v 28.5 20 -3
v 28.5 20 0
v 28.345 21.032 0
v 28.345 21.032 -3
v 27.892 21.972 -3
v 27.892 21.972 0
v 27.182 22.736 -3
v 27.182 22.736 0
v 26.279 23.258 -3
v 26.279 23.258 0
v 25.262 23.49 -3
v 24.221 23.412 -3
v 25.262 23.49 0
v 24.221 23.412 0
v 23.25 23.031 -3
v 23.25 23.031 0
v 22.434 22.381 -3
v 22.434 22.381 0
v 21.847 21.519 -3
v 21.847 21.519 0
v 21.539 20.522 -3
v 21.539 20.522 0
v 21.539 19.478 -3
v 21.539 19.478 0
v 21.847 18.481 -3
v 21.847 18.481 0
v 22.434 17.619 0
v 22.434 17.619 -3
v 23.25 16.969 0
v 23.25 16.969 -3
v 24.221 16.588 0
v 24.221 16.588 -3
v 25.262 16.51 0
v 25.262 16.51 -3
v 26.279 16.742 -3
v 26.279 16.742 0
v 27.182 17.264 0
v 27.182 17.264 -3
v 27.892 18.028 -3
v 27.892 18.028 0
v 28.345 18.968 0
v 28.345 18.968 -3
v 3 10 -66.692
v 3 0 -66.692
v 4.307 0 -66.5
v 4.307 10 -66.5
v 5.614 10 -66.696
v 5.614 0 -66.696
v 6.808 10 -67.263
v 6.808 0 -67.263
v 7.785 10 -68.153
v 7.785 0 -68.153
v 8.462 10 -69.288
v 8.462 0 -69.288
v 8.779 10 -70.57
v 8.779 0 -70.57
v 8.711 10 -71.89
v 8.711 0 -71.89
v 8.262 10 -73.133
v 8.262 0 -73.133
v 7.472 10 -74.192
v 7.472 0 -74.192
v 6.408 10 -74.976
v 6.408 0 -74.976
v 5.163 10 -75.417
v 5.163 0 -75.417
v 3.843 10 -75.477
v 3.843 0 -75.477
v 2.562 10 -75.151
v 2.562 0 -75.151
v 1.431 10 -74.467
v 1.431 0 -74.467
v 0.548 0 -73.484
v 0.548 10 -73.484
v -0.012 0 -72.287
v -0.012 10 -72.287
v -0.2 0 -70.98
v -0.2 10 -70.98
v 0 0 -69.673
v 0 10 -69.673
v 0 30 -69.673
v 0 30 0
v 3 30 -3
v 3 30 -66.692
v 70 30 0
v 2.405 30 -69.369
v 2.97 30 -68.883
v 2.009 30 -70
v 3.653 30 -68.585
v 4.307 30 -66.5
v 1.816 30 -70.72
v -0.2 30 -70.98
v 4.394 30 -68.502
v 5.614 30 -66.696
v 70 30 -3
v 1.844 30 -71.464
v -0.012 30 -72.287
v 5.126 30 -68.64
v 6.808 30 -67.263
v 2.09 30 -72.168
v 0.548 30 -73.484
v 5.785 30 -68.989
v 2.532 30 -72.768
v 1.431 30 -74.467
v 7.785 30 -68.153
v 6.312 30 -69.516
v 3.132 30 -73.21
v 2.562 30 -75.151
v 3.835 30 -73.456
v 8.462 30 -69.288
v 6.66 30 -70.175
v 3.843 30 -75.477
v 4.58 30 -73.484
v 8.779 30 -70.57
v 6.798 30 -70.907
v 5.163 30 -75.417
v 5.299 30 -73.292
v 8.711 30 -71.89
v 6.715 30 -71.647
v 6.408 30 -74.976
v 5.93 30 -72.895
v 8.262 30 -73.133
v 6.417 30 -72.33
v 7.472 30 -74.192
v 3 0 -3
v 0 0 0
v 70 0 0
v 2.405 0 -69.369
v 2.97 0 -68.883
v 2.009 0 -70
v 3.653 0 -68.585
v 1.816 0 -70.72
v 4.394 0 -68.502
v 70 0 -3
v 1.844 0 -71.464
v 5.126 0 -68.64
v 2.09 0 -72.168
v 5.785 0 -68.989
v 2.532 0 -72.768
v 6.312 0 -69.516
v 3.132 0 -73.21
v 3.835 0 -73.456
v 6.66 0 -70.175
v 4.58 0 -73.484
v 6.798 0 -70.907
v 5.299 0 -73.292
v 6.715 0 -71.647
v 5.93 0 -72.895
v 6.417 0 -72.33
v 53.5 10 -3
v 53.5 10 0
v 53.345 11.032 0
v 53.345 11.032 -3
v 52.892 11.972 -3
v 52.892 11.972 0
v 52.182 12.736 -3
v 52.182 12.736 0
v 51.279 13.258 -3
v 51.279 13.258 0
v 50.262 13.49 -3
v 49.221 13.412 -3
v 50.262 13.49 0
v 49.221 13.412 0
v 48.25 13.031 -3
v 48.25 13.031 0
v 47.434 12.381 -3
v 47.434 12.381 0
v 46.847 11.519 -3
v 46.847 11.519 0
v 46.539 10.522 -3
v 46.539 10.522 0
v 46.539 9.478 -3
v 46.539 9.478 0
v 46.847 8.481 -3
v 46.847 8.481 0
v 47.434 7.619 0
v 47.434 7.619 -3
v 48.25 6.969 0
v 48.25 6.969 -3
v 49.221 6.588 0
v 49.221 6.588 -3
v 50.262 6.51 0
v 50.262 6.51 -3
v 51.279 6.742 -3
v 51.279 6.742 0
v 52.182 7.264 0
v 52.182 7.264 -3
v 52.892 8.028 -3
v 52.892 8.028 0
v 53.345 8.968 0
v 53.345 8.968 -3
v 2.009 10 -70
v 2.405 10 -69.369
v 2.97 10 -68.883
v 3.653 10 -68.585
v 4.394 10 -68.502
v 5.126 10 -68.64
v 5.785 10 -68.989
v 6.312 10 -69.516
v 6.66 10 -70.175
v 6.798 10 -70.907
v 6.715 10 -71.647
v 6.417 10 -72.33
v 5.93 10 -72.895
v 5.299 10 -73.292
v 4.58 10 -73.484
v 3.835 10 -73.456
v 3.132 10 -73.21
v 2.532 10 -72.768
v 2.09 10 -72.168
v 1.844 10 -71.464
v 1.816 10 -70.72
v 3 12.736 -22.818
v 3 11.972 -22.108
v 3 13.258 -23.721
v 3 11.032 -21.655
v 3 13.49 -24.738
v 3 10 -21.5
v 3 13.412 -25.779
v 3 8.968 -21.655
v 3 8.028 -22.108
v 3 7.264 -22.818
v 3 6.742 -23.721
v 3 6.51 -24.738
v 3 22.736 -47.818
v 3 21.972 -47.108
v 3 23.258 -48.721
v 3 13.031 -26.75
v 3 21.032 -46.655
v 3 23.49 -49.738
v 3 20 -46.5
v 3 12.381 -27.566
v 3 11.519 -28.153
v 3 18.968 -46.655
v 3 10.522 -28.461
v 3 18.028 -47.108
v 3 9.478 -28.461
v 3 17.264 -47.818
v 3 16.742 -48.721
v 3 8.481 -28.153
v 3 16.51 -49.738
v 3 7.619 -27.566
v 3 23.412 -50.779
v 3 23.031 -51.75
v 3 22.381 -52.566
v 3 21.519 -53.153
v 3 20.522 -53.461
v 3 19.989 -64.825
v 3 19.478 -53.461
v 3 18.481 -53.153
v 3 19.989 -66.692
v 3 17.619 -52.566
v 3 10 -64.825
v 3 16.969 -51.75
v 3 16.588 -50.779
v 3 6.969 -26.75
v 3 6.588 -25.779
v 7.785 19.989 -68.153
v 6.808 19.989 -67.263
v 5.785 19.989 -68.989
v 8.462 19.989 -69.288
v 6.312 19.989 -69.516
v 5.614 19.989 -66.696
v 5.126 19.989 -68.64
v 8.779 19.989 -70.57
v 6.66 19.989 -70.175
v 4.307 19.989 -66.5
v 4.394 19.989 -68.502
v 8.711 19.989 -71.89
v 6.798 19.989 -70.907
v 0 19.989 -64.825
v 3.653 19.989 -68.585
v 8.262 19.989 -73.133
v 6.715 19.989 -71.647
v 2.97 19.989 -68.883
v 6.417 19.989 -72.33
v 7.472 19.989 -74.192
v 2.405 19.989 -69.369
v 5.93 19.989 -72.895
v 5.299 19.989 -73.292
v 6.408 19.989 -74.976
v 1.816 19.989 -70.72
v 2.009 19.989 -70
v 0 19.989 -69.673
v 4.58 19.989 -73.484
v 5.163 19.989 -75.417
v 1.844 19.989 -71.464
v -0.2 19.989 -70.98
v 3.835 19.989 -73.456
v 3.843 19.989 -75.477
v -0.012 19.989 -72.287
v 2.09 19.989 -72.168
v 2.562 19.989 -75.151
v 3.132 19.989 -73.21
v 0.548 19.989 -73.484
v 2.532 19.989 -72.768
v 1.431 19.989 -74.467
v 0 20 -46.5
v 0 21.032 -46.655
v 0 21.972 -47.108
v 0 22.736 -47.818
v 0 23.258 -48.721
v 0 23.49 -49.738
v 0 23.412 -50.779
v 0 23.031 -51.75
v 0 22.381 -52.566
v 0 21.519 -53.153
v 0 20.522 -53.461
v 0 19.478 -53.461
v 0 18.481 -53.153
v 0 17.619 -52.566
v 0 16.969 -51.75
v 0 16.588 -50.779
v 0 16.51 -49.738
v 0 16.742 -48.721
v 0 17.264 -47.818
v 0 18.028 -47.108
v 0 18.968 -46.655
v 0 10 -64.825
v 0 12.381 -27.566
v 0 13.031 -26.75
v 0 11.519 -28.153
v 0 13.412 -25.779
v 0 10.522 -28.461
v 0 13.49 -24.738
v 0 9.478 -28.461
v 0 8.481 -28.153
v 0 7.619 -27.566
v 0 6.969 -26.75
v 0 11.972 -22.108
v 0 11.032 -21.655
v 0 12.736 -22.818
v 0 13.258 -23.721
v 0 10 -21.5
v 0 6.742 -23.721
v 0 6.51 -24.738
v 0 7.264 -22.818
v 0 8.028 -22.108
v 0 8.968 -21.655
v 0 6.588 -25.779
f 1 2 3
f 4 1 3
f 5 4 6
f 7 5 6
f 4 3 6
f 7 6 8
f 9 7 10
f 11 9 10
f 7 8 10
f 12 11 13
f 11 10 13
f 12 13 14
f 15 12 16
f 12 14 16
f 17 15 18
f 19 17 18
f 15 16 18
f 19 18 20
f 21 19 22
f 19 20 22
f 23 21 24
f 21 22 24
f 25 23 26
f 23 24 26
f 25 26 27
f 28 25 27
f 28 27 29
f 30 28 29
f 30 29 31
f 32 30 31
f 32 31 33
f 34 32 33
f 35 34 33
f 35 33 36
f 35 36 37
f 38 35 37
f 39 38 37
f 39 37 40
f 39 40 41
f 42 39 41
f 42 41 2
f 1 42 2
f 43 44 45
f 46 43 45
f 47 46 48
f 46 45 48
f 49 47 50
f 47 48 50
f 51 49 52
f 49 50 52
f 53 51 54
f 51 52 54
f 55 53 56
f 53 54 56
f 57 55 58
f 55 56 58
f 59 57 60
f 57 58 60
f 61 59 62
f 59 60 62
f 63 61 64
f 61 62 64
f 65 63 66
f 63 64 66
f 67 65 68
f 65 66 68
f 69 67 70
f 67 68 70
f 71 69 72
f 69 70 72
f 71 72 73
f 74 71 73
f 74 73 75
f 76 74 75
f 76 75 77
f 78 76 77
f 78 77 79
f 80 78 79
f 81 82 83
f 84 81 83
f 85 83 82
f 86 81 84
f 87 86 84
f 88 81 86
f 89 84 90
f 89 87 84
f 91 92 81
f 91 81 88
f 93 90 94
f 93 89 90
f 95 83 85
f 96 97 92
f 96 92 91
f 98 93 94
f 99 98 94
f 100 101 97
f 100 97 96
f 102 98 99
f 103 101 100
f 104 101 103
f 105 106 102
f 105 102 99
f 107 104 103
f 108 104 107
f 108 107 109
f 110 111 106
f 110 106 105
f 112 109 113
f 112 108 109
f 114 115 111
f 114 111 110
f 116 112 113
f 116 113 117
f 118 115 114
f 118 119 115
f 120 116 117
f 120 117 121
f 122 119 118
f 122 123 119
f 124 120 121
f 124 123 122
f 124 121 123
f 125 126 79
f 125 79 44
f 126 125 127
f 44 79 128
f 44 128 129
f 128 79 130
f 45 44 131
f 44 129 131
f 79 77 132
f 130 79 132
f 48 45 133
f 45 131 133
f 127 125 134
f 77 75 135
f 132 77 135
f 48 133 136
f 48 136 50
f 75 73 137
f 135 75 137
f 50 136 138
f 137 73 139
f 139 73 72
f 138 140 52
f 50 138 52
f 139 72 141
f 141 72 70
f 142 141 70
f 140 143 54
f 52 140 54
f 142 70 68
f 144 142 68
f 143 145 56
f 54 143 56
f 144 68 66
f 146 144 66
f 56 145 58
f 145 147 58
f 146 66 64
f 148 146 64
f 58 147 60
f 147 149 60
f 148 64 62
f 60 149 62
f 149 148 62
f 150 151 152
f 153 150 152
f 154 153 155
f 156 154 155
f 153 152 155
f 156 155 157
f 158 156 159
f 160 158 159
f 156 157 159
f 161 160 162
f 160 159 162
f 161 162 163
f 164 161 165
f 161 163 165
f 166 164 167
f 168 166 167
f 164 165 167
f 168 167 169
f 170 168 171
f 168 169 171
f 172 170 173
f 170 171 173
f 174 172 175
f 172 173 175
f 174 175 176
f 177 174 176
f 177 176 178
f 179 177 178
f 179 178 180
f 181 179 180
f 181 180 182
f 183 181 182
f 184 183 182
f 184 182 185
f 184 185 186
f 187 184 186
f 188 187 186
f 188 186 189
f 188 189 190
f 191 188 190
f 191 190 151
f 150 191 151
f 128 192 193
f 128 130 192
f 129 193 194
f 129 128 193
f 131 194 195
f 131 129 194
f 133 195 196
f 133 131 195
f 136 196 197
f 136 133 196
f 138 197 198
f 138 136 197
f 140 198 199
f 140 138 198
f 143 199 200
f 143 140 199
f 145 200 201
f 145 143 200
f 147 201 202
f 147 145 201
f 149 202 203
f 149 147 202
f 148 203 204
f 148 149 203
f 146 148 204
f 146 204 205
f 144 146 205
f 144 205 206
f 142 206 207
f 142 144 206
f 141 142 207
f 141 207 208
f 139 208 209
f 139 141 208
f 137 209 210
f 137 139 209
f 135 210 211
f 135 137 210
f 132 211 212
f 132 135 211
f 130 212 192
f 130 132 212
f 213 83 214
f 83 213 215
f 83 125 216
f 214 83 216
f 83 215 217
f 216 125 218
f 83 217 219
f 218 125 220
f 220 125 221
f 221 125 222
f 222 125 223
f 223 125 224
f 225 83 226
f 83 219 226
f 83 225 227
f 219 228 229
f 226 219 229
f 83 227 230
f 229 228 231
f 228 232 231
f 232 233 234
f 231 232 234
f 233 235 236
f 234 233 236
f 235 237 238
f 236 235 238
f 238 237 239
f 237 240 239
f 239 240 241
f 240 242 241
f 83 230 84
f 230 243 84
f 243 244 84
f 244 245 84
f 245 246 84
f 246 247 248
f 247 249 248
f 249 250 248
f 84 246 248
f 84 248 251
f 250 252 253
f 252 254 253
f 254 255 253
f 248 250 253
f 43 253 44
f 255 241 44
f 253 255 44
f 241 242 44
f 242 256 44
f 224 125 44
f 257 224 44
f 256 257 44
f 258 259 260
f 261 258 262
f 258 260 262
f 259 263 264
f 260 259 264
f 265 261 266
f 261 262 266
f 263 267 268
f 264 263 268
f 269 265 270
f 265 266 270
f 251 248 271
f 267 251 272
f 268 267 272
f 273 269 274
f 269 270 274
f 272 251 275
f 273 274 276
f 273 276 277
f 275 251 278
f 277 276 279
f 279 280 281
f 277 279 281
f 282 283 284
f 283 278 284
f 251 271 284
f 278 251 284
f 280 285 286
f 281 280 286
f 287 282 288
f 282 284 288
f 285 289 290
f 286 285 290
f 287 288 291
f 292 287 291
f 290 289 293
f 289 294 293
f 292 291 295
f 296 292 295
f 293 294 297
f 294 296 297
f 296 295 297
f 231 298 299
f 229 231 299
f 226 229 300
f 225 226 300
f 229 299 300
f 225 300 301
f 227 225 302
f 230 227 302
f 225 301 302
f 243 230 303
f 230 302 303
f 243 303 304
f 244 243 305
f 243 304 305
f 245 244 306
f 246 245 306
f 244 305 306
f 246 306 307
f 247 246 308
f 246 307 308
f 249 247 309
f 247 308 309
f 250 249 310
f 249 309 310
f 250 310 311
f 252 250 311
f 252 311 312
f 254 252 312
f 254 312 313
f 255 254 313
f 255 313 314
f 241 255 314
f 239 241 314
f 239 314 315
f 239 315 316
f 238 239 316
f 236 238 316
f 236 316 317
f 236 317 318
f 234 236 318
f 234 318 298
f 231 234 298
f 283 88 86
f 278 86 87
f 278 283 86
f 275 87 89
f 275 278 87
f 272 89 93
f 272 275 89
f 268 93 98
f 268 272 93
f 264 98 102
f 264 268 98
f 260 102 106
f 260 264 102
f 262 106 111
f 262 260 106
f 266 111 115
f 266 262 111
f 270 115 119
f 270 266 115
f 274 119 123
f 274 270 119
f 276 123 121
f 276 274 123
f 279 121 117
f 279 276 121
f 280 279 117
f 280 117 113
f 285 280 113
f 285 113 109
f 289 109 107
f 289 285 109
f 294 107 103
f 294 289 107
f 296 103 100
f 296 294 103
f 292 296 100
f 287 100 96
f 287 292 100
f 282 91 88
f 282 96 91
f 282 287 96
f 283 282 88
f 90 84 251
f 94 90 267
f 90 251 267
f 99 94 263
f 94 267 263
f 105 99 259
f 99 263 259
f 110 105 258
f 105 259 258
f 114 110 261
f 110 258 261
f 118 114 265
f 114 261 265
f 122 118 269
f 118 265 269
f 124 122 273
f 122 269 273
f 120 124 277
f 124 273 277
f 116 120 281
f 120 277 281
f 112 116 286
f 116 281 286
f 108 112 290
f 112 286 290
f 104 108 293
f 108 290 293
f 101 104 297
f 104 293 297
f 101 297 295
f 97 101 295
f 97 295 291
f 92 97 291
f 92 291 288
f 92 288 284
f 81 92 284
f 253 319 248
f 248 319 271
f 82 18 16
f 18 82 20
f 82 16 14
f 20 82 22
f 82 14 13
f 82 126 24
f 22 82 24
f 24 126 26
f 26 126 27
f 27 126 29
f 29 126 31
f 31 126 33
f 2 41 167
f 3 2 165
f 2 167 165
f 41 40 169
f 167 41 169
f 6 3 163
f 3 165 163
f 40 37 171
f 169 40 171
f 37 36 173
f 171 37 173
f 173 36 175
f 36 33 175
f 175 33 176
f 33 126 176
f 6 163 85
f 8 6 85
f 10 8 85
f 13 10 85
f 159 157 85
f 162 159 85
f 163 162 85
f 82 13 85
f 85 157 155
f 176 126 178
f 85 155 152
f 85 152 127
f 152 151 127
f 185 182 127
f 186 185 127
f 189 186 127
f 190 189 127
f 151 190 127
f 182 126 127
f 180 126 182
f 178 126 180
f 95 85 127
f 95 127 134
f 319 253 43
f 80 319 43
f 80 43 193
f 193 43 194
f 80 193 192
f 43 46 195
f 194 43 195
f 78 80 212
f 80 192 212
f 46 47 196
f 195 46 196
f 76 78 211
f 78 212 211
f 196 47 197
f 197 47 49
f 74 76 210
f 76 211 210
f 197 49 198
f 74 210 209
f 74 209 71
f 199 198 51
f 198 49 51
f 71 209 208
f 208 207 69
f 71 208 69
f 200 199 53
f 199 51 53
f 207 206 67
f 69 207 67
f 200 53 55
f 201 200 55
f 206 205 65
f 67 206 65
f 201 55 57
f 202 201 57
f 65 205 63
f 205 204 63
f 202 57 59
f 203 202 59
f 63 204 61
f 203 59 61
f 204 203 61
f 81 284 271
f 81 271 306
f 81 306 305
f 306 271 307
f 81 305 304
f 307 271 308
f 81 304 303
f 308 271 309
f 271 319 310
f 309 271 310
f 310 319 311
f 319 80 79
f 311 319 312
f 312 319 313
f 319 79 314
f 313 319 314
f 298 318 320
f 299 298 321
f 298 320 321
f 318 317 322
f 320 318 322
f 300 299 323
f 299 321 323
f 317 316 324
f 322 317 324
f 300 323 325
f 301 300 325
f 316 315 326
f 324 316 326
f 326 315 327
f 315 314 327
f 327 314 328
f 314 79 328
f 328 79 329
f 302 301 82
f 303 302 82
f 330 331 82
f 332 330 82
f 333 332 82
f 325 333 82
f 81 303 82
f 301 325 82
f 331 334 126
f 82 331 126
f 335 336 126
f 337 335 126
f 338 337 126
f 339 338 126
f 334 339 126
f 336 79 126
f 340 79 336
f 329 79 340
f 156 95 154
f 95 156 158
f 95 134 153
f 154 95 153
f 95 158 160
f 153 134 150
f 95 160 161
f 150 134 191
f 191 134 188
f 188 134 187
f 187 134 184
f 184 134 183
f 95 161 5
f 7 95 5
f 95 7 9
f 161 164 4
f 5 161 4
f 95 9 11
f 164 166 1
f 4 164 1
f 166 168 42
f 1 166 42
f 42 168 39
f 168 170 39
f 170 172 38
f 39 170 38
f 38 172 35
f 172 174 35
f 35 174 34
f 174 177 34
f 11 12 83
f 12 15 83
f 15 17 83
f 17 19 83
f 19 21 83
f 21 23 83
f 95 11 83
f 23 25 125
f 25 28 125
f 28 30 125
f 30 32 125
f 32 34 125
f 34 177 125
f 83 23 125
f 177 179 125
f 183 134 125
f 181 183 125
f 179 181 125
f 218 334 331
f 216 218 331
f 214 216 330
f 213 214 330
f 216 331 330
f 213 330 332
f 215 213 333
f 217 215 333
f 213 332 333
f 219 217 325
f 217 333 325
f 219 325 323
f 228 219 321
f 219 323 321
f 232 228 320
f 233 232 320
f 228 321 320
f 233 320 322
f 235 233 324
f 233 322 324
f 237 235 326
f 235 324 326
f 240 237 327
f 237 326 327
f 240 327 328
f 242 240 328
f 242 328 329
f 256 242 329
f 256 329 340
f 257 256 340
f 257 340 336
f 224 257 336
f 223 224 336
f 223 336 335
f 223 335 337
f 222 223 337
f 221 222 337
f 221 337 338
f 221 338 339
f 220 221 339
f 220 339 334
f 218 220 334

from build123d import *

# Parameters (mm, degrees)
EXTRUDE_1_DEPTH          = 30
SKETCH_2_R               = 3.5
CUT_EXTRUDE_1_DEPTH      = 71
SKETCH_3_R               = 3.5
CUT_EXTRUDE_2_DEPTH      = 71
SKETCH_4_R               = 4.5
SKETCH_4_R_2             = 2.5
EXTRUDE_2_DEPTH          = 30
SKETCH_5_R               = 2.5
CUT_EXTRUDE_6_DEPTH      = 31
SKETCH_6_W               = 11.97763243
SKETCH_6_H               = 9.98933257
CUT_EXTRUDE_8_DEPTH      = 71
CUT_EXTRUDE_8_DEPTH_BACK = 1.2


with BuildPart() as part:
    # Эскиз1 → Вытянуть-Тонкостенный1 (new body)
    with BuildSketch(Plane(origin=(0, 0, 0), x_dir=(1, 0, 0), z_dir=(0, 1, 0))):
        Polygon((0, 70), (0, 0), (70, 0), (70, 3), (3, 3), (3, 70), align=None)
    extrude(amount=EXTRUDE_1_DEPTH)

    # Эскиз2 → Вырез-Вытянуть1 (cut, through all)
    with BuildSketch(Plane.ZY):
        with Locations((-50, 20)):
            Circle(SKETCH_2_R)
        with Locations((-25, 10)):
            Circle(SKETCH_2_R)
    extrude(amount=-CUT_EXTRUDE_1_DEPTH, mode=Mode.SUBTRACT)

    # Эскиз3 → Вырез-Вытянуть2 (cut, through all)
    with BuildSketch(Plane.XY):
        with Locations((25, 20)):
            Circle(SKETCH_3_R)
        with Locations((50, 10)):
            Circle(SKETCH_3_R)
    extrude(amount=-CUT_EXTRUDE_2_DEPTH, mode=Mode.SUBTRACT)

    # Эскиз4 → Вытянуть-Тонкостенный2 (add)
    with BuildSketch(Plane(origin=(0, 0, 0), x_dir=(1, 0, 0), z_dir=(0, 1, 0))):
        with Locations((4.3, 71)):
            Circle(SKETCH_4_R)
        with Locations((4.3, 71)):
            Circle(SKETCH_4_R_2, mode=Mode.SUBTRACT)
    extrude(amount=EXTRUDE_2_DEPTH)

    # Эскиз5 → Вырез-Вытянуть6 (cut, through all)
    with BuildSketch(Plane(origin=(0, 0, 0), x_dir=(1, 0, 0), z_dir=(0, 1, 0))):
        with Locations((4.3, 71)):
            Circle(SKETCH_5_R)
    extrude(amount=CUT_EXTRUDE_6_DEPTH, mode=Mode.SUBTRACT)

    # Эскиз6 → Вырез-Вытянуть8 (cut, two sides)
    with BuildSketch(Plane(origin=(0, 0, 0), x_dir=(0, 0, -1), z_dir=(1, 0, 0))) as cut_extrude_8_sk:
        with Locations((70.813459228, 14.994666285)):
            Rectangle(SKETCH_6_W, SKETCH_6_H)
    extrude(amount=CUT_EXTRUDE_8_DEPTH, mode=Mode.SUBTRACT)
    extrude(cut_extrude_8_sk.sketch, amount=-CUT_EXTRUDE_8_DEPTH_BACK, mode=Mode.SUBTRACT)


solid = part.part
